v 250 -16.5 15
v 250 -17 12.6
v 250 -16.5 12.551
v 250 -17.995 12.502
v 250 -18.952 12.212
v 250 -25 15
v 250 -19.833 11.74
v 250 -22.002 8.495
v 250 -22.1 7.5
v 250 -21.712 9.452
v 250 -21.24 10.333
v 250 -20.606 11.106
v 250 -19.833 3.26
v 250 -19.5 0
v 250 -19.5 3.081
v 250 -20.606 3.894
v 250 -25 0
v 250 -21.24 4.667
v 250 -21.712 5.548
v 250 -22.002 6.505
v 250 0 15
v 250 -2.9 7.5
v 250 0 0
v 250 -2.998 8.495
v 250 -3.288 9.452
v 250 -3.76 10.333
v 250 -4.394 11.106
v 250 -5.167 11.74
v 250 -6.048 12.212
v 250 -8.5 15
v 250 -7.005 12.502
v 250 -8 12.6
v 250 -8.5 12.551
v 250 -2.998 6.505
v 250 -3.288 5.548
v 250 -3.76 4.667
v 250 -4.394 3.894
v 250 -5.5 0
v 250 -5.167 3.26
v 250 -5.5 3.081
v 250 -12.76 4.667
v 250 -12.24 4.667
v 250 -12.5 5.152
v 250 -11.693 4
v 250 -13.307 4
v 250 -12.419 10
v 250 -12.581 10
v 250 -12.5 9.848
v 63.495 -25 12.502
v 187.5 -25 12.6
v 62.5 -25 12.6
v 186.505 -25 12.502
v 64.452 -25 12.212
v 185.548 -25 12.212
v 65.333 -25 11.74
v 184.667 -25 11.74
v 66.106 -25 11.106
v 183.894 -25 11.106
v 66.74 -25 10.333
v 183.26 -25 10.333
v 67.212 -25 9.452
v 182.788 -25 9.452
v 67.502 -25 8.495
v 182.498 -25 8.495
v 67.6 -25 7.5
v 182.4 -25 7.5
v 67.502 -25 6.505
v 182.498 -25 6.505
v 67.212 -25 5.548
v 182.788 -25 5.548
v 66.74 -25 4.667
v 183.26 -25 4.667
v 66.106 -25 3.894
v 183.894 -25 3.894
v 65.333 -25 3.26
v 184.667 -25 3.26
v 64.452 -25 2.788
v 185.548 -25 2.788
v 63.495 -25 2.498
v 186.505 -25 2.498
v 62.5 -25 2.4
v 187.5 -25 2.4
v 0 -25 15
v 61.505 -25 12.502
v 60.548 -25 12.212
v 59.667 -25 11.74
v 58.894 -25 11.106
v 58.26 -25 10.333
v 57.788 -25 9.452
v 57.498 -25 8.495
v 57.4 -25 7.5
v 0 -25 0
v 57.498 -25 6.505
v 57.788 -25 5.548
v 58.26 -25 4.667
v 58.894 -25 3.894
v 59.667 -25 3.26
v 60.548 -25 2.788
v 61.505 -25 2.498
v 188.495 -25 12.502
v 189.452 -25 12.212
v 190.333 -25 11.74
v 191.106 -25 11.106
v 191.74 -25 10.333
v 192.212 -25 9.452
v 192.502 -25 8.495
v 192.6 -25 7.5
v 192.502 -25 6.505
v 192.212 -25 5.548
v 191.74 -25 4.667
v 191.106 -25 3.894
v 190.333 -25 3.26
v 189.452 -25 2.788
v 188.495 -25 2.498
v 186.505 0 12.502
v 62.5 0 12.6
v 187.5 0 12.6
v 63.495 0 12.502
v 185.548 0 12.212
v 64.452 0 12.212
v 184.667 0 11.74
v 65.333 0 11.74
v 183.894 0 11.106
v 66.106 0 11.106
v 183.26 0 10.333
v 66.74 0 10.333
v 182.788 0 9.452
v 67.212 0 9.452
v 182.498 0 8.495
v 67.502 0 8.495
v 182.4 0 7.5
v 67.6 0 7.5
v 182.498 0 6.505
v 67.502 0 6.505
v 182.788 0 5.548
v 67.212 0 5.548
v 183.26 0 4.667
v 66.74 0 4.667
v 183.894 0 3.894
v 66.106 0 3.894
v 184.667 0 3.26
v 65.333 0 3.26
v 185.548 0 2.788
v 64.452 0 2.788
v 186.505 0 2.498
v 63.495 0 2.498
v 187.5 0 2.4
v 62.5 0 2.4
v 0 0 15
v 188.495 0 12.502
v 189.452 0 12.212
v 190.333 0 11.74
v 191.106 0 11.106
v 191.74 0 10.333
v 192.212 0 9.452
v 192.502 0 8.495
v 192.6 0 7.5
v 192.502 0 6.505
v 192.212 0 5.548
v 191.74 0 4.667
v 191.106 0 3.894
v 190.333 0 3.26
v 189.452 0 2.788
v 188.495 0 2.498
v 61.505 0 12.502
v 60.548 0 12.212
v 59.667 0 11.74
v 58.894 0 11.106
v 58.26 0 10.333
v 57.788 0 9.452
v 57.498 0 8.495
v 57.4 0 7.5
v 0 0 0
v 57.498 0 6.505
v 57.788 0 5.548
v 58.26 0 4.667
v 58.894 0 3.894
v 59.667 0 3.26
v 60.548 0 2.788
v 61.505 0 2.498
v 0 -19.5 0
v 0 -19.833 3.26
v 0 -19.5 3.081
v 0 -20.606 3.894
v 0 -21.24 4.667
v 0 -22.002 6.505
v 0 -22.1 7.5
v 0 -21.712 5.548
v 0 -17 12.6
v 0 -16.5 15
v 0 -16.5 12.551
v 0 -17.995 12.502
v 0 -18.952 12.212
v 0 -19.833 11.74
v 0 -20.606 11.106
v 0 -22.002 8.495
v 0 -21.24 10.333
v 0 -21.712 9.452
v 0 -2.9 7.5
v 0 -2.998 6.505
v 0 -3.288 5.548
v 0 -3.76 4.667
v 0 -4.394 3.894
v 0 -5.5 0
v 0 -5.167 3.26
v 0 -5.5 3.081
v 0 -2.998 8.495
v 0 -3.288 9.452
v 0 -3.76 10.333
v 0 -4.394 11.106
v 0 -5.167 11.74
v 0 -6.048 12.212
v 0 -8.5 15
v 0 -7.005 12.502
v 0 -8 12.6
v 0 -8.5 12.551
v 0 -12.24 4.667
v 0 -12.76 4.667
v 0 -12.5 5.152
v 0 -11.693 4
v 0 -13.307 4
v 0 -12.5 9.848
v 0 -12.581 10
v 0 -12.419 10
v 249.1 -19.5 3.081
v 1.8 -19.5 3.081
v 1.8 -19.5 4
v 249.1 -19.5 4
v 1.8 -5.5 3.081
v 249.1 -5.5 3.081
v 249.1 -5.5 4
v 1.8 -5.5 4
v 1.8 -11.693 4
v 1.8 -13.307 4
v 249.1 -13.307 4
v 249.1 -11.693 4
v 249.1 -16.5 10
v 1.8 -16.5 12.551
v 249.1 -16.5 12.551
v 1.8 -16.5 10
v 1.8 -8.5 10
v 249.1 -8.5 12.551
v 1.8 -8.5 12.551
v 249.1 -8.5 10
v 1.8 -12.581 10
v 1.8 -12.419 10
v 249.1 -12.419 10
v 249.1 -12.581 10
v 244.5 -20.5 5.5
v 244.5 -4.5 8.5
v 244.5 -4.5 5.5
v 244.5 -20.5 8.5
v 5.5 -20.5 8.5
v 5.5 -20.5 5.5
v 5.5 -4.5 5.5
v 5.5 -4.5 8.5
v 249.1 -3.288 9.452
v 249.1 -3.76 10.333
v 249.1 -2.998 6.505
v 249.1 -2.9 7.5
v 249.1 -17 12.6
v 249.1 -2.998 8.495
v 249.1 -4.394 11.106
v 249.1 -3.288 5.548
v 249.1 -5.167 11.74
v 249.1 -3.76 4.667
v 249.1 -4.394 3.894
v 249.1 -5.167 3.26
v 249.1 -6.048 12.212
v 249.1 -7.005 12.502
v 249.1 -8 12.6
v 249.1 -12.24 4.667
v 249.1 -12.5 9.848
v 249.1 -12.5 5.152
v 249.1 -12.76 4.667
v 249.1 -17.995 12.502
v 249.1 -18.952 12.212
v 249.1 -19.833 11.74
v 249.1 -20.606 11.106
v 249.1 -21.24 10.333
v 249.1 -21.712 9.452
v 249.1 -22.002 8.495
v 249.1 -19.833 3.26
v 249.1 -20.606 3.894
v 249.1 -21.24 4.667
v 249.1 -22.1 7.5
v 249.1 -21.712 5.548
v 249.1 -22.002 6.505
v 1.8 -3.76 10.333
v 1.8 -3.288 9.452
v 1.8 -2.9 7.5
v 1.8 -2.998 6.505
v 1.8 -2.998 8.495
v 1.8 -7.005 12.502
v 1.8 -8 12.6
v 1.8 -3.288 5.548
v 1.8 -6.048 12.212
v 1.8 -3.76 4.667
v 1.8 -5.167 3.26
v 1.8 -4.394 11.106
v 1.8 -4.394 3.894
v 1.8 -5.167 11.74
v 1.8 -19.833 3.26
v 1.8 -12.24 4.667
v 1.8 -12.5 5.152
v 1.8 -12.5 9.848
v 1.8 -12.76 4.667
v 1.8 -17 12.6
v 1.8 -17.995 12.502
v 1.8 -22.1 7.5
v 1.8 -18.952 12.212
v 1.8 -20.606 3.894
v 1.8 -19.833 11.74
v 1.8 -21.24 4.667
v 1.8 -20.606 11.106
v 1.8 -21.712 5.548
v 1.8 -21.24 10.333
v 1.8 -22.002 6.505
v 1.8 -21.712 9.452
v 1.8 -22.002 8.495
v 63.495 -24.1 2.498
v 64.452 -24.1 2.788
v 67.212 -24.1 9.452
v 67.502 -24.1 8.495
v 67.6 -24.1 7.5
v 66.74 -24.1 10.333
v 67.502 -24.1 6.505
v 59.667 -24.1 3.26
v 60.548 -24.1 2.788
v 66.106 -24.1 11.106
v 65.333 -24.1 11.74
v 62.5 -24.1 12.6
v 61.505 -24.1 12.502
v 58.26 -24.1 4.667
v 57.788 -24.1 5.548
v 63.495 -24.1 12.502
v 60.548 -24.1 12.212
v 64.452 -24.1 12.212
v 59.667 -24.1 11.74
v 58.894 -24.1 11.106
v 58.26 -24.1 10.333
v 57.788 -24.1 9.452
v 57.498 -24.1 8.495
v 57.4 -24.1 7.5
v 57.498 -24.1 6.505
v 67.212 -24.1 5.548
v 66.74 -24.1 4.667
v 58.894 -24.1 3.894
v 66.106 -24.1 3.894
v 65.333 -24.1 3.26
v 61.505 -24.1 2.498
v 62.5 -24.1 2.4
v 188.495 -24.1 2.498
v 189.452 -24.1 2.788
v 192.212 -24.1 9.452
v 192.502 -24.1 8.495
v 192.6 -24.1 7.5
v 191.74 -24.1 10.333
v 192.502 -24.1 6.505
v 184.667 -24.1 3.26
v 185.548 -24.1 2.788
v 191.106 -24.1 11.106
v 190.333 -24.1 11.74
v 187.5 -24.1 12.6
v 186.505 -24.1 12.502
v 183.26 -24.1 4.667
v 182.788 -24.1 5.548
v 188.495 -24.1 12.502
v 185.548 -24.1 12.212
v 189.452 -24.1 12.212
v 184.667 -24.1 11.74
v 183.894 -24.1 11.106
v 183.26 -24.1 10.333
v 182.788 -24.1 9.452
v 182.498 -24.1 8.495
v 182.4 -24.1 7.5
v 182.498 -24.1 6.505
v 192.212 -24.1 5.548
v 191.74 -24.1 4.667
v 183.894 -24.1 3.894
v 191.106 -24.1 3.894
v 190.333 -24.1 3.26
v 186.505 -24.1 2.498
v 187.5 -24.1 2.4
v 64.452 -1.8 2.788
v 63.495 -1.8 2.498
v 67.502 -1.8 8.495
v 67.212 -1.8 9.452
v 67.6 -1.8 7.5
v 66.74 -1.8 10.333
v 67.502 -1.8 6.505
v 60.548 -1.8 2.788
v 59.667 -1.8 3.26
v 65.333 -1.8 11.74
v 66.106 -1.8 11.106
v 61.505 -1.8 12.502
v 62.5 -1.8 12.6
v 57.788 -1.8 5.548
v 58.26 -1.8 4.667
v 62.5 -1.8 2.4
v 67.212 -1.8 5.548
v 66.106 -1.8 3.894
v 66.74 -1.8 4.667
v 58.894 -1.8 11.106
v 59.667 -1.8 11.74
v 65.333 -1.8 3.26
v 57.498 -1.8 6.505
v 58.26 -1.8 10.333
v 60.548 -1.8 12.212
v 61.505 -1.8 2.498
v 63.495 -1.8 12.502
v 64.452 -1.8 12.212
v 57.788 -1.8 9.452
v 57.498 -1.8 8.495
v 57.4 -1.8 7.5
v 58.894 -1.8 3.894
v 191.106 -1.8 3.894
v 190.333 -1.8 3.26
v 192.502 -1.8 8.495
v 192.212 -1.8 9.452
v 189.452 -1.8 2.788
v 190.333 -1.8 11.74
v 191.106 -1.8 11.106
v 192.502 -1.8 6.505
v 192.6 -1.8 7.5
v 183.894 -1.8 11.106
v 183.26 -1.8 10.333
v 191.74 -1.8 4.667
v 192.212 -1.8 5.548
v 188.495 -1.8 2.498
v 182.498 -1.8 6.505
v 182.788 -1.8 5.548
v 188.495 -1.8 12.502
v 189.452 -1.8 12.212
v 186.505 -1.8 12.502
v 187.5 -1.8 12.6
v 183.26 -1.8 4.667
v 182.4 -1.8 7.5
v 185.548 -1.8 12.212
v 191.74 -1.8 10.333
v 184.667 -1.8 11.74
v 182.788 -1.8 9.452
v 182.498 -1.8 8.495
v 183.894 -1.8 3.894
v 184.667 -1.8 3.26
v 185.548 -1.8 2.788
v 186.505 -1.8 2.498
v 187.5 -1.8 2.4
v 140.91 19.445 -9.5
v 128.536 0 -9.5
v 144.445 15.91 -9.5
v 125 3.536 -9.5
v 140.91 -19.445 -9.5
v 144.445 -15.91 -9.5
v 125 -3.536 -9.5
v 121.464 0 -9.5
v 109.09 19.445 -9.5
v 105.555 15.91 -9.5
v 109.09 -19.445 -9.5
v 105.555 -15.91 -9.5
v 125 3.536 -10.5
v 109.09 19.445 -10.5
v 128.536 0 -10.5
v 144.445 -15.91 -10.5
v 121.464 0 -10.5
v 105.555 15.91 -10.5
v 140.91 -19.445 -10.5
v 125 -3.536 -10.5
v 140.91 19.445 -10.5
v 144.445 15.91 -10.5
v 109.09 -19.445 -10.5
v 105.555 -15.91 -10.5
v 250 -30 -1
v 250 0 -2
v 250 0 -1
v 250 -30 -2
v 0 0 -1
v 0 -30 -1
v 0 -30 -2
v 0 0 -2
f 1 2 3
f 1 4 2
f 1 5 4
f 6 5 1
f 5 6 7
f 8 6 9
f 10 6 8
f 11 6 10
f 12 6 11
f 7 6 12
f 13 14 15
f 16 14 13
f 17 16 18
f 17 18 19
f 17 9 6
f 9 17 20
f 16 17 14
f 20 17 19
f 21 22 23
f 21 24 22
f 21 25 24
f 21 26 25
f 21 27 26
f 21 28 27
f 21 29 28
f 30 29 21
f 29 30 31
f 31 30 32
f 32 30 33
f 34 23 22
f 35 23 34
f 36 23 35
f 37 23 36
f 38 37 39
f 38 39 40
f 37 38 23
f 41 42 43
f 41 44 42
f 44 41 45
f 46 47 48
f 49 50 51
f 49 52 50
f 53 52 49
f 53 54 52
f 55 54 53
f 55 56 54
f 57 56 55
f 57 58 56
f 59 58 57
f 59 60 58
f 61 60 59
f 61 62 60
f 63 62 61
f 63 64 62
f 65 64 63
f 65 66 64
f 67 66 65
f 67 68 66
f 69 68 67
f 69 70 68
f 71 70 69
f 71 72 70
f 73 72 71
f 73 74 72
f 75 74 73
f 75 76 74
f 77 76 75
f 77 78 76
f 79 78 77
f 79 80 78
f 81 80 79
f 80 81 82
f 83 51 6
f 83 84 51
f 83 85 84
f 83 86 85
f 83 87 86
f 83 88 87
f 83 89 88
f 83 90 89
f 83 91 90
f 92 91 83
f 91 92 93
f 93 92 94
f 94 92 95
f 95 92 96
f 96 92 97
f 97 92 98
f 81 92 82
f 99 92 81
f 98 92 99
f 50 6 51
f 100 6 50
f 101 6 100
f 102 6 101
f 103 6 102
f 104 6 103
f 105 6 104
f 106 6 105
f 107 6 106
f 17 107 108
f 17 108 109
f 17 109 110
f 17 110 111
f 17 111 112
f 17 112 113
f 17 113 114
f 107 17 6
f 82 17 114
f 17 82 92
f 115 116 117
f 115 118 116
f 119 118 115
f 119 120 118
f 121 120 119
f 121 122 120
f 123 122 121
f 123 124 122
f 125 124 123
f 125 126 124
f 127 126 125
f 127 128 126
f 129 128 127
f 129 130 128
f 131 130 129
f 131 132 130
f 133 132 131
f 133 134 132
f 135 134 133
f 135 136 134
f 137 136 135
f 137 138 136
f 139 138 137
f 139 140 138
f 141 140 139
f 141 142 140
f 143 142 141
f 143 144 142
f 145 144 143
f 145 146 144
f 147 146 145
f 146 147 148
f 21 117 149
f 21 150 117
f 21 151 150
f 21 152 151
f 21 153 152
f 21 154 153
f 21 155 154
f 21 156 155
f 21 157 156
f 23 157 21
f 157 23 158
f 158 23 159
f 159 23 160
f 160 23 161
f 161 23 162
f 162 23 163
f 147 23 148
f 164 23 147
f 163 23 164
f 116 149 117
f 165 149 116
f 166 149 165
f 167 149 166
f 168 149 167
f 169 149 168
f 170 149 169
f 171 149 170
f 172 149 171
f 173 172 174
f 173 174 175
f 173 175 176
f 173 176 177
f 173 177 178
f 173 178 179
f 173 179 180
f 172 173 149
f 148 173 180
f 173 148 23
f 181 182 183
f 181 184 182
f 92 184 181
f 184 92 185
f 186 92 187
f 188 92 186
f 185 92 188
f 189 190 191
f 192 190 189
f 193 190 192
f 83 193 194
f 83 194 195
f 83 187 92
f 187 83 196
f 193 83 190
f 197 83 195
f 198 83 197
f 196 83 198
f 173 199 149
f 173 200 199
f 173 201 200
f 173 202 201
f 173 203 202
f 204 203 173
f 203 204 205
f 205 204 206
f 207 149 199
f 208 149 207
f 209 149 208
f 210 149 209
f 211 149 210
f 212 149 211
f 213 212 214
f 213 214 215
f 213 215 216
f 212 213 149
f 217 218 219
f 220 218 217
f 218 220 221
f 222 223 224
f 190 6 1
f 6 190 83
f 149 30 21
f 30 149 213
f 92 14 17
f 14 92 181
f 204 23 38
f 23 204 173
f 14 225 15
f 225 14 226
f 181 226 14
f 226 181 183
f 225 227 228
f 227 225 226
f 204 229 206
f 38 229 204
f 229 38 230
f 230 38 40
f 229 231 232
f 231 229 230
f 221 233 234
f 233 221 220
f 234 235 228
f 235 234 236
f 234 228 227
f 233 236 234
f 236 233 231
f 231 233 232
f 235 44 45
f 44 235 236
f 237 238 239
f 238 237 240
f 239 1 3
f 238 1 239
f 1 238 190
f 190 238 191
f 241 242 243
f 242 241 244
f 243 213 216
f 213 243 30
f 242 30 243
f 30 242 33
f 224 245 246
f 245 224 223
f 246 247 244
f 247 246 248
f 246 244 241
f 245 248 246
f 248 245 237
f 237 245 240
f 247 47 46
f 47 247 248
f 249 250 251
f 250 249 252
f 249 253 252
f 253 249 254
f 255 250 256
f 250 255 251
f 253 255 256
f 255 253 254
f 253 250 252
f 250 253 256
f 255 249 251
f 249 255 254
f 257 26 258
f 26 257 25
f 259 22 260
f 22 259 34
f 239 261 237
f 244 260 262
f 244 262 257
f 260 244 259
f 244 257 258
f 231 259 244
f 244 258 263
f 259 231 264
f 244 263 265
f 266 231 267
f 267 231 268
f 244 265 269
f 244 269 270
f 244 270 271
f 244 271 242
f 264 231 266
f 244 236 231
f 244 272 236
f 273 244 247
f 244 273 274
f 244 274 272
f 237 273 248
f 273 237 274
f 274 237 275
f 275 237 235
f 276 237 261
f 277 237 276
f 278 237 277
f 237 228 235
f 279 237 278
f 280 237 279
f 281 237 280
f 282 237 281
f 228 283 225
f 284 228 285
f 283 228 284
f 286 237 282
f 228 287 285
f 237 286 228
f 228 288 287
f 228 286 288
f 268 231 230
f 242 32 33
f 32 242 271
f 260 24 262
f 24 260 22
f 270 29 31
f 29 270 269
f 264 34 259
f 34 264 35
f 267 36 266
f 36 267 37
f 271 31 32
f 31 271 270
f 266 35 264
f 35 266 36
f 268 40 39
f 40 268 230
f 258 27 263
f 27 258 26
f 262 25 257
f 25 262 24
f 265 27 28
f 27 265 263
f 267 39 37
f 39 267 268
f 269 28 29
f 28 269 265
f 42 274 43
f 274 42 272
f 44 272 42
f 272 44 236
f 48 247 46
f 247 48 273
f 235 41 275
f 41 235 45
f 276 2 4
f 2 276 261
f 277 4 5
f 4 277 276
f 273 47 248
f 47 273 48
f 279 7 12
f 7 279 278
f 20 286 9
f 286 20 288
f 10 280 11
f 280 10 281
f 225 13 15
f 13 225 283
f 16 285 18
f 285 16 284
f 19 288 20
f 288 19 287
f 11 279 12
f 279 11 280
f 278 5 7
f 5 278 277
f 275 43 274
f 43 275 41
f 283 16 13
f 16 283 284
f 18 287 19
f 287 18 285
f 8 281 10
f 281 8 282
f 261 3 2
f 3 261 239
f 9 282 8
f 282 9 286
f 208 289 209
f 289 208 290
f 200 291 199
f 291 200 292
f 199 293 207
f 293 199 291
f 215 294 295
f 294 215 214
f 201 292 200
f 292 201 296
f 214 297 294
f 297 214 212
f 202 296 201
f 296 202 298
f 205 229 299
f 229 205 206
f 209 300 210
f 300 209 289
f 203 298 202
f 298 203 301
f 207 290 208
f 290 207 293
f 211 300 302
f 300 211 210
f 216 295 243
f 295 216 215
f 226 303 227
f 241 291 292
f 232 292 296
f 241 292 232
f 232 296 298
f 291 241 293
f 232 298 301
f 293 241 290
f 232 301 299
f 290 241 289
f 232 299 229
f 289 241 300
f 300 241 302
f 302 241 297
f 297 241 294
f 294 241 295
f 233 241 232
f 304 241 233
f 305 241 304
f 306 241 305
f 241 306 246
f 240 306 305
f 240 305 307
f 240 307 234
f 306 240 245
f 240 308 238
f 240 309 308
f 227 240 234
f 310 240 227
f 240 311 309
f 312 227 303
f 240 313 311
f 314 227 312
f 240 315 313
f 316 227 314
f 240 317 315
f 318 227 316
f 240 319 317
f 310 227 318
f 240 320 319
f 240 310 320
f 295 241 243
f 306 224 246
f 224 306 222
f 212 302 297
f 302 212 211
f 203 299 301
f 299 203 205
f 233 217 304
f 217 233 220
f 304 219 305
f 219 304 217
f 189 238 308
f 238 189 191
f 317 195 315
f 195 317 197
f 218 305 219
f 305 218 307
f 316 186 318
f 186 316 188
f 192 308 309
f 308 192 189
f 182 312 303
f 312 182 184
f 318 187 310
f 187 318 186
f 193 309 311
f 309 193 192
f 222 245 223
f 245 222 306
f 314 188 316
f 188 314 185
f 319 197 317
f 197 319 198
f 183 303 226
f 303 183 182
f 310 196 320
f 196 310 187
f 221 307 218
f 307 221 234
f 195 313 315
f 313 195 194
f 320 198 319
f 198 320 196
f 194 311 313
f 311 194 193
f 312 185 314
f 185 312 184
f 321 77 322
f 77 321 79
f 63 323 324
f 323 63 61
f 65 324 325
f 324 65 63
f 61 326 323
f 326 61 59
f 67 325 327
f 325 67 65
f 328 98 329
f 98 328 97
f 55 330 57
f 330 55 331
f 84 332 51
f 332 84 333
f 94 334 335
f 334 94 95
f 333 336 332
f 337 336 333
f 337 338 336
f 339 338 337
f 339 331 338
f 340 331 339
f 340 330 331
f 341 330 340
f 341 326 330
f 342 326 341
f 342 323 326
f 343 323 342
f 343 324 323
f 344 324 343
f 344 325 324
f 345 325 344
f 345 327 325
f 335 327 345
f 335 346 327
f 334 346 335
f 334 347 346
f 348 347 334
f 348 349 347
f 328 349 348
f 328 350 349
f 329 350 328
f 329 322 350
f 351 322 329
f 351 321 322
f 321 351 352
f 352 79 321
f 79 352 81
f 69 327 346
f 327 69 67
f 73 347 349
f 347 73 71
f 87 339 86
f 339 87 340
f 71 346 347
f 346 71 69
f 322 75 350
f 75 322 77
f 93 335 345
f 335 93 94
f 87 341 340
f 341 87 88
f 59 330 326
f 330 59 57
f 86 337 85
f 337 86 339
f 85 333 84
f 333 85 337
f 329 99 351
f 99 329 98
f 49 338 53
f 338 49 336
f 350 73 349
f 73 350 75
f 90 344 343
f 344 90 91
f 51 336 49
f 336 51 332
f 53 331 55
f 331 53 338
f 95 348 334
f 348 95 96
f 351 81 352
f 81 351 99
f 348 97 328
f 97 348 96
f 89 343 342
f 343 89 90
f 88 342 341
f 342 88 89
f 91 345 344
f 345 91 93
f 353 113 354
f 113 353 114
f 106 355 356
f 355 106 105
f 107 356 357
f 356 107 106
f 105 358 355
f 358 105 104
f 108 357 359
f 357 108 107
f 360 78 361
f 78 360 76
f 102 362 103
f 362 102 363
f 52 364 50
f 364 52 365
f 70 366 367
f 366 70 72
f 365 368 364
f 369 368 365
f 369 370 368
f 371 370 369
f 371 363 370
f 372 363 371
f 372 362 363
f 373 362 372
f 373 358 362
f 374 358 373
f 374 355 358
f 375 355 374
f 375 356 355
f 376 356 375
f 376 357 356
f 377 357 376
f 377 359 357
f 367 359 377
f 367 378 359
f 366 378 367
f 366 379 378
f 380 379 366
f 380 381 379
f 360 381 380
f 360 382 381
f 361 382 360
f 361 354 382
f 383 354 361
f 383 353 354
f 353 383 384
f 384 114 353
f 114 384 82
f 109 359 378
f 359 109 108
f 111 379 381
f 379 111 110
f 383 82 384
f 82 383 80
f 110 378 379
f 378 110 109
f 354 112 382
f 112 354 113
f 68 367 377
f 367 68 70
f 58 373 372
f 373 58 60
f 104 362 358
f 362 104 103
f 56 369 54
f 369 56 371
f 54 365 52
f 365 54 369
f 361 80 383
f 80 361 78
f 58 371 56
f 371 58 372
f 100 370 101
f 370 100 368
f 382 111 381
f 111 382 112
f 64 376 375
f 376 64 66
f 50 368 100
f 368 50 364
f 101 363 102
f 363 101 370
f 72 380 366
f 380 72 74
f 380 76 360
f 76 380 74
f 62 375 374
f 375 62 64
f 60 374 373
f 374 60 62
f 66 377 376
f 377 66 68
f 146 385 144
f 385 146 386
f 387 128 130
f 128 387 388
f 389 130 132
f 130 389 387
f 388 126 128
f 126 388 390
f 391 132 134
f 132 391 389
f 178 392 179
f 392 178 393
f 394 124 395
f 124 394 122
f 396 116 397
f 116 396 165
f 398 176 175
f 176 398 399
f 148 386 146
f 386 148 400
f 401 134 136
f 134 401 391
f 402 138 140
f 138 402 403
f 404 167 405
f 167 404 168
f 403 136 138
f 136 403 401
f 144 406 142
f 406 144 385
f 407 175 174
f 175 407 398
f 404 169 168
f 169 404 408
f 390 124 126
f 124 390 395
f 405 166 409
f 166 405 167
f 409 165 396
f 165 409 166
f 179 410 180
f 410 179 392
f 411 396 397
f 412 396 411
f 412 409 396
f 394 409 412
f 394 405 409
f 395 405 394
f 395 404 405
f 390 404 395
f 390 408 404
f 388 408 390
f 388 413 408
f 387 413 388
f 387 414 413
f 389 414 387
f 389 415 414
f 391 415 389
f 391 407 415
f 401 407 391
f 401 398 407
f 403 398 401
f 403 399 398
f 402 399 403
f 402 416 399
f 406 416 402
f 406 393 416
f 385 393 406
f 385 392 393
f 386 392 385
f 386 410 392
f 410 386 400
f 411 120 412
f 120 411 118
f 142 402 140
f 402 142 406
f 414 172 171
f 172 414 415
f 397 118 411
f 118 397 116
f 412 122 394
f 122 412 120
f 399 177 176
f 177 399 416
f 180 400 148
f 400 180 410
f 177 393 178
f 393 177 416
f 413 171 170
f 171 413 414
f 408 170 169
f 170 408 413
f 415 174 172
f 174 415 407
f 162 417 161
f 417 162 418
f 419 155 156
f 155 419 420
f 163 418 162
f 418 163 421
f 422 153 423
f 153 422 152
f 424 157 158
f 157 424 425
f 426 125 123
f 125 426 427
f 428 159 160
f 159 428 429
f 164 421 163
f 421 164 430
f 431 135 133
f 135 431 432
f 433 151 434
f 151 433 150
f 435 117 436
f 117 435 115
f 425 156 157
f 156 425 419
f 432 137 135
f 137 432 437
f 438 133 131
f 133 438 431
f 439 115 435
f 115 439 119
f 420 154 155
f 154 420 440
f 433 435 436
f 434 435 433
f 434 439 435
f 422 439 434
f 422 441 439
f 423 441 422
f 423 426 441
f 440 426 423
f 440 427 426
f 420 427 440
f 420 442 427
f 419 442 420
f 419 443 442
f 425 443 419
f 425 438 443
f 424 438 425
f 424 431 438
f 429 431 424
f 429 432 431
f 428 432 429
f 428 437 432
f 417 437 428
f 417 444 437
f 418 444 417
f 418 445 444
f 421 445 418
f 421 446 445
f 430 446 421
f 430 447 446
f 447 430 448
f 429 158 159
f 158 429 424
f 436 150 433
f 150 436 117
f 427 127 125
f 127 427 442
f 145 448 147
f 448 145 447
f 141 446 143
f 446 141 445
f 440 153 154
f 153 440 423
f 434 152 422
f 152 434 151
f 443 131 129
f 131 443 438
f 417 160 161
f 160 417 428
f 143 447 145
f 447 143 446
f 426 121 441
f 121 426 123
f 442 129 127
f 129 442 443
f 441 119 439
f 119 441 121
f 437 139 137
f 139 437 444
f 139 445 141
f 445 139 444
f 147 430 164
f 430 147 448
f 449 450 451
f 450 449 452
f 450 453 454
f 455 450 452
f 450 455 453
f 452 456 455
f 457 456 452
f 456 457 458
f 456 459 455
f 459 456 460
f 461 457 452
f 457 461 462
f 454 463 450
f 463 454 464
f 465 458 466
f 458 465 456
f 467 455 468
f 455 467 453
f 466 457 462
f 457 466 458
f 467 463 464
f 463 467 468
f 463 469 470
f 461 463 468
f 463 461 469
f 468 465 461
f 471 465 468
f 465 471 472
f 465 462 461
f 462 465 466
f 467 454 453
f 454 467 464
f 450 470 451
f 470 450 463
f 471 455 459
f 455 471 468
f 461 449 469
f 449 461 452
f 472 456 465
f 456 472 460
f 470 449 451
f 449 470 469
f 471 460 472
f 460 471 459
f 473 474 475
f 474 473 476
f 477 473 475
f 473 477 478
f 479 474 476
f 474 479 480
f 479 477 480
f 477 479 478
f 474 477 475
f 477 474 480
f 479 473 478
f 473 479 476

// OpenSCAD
// file: single_module.scad
/*
 * Single LED Strip Module - Minimal Design
 * Compact holder for one section of WS2812B LED strip
 *
 * Features:
 * - Minimal size - just enough to hold the strip
 * - 4 magnet holes for modular connections
 * - Lightweight and movable
 */

// ========== CONFIGURATION ==========

// LED Strip dimensions
strip_segment_length = 250;  // Length of this module
strip_width = 12;            // WS2812B strip width

// Module dimensions (MINIMIZED)
module_width = strip_segment_length;
module_height = 25;          // 2.5cm vertical spacing (compact!)
module_depth = 15;           // Reduced from 20mm to 15mm
wall_thickness = 1.5;        // Reduced from 2mm to 1.5mm

// LED channel (on front)
led_channel_depth = 4;       // Shallow groove (reduced from 5mm)
led_channel_width = 14;      // Increased to 14mm for better fit

// Wire channel (on back)
wire_channel_width = 8;      // Narrow channel for wires
wire_channel_depth = 5;      // Back routing space

// Magnets (user's magnets: 10mm dia × 1.54mm thick)
magnet_dia = 10.2;           // 10mm + 0.2mm tolerance
magnet_thickness = 1.8;      // 1.54mm + tolerance (thin!)
magnet_inset = 8;            // Distance from edges (adjusted for 25mm height)

// ========== SINGLE MODULE ==========

module minimal_strip_holder() {
    difference() {
        // Main body - thin shell
        cube([module_width, module_depth, module_height]);

        // Front LED channel (OPEN ENDS - strip passes through)
        translate([-0.1, -0.1, module_height/2 - led_channel_width/2])
            cube([module_width + 0.2,  // Goes all the way through left to right
                  led_channel_depth + 0.1,
                  led_channel_width]);

        // Back wire channel (OPEN ENDS - wires pass through)
        translate([-0.1, module_depth - wire_channel_depth, module_height/2 - wire_channel_width/2])
            cube([module_width + 0.2,  // Goes all the way through left to right
                  wire_channel_depth + 0.1,
                  wire_channel_width]);

        // Center cavity (weight reduction)
        translate([wall_thickness + 4,
                  led_channel_depth + wall_thickness,
                  wall_thickness + 3])
            cube([module_width - 2*wall_thickness - 8,
                  module_depth - led_channel_depth - wire_channel_depth - 2*wall_thickness,
                  module_height - 2*wall_thickness - 6]);

        // HORIZONTAL magnets (left/right)
        // Right side
        translate([module_width - magnet_thickness/2, module_depth/2, magnet_inset])
            rotate([0, 90, 0])
            cylinder(h=magnet_thickness + 0.1, d=magnet_dia, $fn=32);
        translate([module_width - magnet_thickness/2, module_depth/2, module_height - magnet_inset])
            rotate([0, 90, 0])
            cylinder(h=magnet_thickness + 0.1, d=magnet_dia, $fn=32);

        // Left side
        translate([-0.1, module_depth/2, magnet_inset])
            rotate([0, 90, 0])
            cylinder(h=magnet_thickness + 0.1, d=magnet_dia, $fn=32);
        translate([-0.1, module_depth/2, module_height - magnet_inset])
            rotate([0, 90, 0])
            cylinder(h=magnet_thickness + 0.1, d=magnet_dia, $fn=32);

        // VERTICAL magnets (top/bottom)
        // Top
        translate([module_width/4, module_depth/2, module_height - magnet_thickness/2])
            cylinder(h=magnet_thickness + 0.1, d=magnet_dia, $fn=32);
        translate([3*module_width/4, module_depth/2, module_height - magnet_thickness/2])
            cylinder(h=magnet_thickness + 0.1, d=magnet_dia, $fn=32);

        // Bottom
        translate([module_width/4, module_depth/2, -0.1])
            cylinder(h=magnet_thickness + 0.1, d=magnet_dia, $fn=32);
        translate([3*module_width/4, module_depth/2, -0.1])
            cylinder(h=magnet_thickness + 0.1, d=magnet_dia, $fn=32);
    }
}

// LED strip visualization (optional)
module led_strip_visual() {
    color("white", 0.9)
    translate([wall_thickness, led_channel_depth - 3, module_height/2 - strip_width/2])
    rotate([90, 0, 0])
    cube([module_width - 2*wall_thickness, strip_width, 3]);

    // LEDs
    led_spacing = module_width / 36;  // 36 LEDs per module
    for (i = [0:35]) {
        color("gold", 0.8)
        translate([i * led_spacing + led_spacing/2,
                  1,
                  module_height/2])
            rotate([90, 0, 0])
            cylinder(h=2, d=4, $fn=6);
    }
}

// ========== RENDER ==========

// Show module
minimal_strip_holder();

// Show LED strip (uncomment to visualize)
// led_strip_visual();

// ========== EXPORT NOTES ==========
/*
 * DIMENSIONS:
 * - Size: 250mm (W) × 50mm (H) × 15mm (D)
 * - Weight: ~15-18g per module (at 15% infill)
 * - Wall thickness: 1.5mm
 *
 * MAGNETS:
 * - 4× 10mm × 3mm neodymium magnets per module
 * - Amazon: "neodymium magnets 10mm x 3mm N52"
 *
 * PRINTING:
 * - Layer height: 0.2mm
 * - Infill: 15%
 * - No supports needed
 * - Print time: ~1-1.5 hours per module
 *
 * CUSTOMIZATION:
 * - Adjust module_width for different lengths (e.g., 200mm, 333mm)
 * - Change module_height for different spacing (e.g., 30mm, 40mm, 60mm)
 * - Modify led_channel_width if your strip is wider/narrower
 *
 * EXPORT STL:
 * openscad -o module.stl single_module.scad
 */
// main file
use <single_module.scad>

// BAD orientation - wide side down (rotated 90°)
rotate([90, 0, 0])
    minimal_strip_holder();

// Show build plate underneath
translate([0, -30, -2])
    color("red", 0.5)
    cube([250, 30, 1]);

// X mark showing "WRONG"
translate([125, 0, -10]) {
    color("red") {
        rotate([0, 0, 45]) cube([5, 50, 1], center=true);
        rotate([0, 0, -45]) cube([5, 50, 1], center=true);
    }
}
